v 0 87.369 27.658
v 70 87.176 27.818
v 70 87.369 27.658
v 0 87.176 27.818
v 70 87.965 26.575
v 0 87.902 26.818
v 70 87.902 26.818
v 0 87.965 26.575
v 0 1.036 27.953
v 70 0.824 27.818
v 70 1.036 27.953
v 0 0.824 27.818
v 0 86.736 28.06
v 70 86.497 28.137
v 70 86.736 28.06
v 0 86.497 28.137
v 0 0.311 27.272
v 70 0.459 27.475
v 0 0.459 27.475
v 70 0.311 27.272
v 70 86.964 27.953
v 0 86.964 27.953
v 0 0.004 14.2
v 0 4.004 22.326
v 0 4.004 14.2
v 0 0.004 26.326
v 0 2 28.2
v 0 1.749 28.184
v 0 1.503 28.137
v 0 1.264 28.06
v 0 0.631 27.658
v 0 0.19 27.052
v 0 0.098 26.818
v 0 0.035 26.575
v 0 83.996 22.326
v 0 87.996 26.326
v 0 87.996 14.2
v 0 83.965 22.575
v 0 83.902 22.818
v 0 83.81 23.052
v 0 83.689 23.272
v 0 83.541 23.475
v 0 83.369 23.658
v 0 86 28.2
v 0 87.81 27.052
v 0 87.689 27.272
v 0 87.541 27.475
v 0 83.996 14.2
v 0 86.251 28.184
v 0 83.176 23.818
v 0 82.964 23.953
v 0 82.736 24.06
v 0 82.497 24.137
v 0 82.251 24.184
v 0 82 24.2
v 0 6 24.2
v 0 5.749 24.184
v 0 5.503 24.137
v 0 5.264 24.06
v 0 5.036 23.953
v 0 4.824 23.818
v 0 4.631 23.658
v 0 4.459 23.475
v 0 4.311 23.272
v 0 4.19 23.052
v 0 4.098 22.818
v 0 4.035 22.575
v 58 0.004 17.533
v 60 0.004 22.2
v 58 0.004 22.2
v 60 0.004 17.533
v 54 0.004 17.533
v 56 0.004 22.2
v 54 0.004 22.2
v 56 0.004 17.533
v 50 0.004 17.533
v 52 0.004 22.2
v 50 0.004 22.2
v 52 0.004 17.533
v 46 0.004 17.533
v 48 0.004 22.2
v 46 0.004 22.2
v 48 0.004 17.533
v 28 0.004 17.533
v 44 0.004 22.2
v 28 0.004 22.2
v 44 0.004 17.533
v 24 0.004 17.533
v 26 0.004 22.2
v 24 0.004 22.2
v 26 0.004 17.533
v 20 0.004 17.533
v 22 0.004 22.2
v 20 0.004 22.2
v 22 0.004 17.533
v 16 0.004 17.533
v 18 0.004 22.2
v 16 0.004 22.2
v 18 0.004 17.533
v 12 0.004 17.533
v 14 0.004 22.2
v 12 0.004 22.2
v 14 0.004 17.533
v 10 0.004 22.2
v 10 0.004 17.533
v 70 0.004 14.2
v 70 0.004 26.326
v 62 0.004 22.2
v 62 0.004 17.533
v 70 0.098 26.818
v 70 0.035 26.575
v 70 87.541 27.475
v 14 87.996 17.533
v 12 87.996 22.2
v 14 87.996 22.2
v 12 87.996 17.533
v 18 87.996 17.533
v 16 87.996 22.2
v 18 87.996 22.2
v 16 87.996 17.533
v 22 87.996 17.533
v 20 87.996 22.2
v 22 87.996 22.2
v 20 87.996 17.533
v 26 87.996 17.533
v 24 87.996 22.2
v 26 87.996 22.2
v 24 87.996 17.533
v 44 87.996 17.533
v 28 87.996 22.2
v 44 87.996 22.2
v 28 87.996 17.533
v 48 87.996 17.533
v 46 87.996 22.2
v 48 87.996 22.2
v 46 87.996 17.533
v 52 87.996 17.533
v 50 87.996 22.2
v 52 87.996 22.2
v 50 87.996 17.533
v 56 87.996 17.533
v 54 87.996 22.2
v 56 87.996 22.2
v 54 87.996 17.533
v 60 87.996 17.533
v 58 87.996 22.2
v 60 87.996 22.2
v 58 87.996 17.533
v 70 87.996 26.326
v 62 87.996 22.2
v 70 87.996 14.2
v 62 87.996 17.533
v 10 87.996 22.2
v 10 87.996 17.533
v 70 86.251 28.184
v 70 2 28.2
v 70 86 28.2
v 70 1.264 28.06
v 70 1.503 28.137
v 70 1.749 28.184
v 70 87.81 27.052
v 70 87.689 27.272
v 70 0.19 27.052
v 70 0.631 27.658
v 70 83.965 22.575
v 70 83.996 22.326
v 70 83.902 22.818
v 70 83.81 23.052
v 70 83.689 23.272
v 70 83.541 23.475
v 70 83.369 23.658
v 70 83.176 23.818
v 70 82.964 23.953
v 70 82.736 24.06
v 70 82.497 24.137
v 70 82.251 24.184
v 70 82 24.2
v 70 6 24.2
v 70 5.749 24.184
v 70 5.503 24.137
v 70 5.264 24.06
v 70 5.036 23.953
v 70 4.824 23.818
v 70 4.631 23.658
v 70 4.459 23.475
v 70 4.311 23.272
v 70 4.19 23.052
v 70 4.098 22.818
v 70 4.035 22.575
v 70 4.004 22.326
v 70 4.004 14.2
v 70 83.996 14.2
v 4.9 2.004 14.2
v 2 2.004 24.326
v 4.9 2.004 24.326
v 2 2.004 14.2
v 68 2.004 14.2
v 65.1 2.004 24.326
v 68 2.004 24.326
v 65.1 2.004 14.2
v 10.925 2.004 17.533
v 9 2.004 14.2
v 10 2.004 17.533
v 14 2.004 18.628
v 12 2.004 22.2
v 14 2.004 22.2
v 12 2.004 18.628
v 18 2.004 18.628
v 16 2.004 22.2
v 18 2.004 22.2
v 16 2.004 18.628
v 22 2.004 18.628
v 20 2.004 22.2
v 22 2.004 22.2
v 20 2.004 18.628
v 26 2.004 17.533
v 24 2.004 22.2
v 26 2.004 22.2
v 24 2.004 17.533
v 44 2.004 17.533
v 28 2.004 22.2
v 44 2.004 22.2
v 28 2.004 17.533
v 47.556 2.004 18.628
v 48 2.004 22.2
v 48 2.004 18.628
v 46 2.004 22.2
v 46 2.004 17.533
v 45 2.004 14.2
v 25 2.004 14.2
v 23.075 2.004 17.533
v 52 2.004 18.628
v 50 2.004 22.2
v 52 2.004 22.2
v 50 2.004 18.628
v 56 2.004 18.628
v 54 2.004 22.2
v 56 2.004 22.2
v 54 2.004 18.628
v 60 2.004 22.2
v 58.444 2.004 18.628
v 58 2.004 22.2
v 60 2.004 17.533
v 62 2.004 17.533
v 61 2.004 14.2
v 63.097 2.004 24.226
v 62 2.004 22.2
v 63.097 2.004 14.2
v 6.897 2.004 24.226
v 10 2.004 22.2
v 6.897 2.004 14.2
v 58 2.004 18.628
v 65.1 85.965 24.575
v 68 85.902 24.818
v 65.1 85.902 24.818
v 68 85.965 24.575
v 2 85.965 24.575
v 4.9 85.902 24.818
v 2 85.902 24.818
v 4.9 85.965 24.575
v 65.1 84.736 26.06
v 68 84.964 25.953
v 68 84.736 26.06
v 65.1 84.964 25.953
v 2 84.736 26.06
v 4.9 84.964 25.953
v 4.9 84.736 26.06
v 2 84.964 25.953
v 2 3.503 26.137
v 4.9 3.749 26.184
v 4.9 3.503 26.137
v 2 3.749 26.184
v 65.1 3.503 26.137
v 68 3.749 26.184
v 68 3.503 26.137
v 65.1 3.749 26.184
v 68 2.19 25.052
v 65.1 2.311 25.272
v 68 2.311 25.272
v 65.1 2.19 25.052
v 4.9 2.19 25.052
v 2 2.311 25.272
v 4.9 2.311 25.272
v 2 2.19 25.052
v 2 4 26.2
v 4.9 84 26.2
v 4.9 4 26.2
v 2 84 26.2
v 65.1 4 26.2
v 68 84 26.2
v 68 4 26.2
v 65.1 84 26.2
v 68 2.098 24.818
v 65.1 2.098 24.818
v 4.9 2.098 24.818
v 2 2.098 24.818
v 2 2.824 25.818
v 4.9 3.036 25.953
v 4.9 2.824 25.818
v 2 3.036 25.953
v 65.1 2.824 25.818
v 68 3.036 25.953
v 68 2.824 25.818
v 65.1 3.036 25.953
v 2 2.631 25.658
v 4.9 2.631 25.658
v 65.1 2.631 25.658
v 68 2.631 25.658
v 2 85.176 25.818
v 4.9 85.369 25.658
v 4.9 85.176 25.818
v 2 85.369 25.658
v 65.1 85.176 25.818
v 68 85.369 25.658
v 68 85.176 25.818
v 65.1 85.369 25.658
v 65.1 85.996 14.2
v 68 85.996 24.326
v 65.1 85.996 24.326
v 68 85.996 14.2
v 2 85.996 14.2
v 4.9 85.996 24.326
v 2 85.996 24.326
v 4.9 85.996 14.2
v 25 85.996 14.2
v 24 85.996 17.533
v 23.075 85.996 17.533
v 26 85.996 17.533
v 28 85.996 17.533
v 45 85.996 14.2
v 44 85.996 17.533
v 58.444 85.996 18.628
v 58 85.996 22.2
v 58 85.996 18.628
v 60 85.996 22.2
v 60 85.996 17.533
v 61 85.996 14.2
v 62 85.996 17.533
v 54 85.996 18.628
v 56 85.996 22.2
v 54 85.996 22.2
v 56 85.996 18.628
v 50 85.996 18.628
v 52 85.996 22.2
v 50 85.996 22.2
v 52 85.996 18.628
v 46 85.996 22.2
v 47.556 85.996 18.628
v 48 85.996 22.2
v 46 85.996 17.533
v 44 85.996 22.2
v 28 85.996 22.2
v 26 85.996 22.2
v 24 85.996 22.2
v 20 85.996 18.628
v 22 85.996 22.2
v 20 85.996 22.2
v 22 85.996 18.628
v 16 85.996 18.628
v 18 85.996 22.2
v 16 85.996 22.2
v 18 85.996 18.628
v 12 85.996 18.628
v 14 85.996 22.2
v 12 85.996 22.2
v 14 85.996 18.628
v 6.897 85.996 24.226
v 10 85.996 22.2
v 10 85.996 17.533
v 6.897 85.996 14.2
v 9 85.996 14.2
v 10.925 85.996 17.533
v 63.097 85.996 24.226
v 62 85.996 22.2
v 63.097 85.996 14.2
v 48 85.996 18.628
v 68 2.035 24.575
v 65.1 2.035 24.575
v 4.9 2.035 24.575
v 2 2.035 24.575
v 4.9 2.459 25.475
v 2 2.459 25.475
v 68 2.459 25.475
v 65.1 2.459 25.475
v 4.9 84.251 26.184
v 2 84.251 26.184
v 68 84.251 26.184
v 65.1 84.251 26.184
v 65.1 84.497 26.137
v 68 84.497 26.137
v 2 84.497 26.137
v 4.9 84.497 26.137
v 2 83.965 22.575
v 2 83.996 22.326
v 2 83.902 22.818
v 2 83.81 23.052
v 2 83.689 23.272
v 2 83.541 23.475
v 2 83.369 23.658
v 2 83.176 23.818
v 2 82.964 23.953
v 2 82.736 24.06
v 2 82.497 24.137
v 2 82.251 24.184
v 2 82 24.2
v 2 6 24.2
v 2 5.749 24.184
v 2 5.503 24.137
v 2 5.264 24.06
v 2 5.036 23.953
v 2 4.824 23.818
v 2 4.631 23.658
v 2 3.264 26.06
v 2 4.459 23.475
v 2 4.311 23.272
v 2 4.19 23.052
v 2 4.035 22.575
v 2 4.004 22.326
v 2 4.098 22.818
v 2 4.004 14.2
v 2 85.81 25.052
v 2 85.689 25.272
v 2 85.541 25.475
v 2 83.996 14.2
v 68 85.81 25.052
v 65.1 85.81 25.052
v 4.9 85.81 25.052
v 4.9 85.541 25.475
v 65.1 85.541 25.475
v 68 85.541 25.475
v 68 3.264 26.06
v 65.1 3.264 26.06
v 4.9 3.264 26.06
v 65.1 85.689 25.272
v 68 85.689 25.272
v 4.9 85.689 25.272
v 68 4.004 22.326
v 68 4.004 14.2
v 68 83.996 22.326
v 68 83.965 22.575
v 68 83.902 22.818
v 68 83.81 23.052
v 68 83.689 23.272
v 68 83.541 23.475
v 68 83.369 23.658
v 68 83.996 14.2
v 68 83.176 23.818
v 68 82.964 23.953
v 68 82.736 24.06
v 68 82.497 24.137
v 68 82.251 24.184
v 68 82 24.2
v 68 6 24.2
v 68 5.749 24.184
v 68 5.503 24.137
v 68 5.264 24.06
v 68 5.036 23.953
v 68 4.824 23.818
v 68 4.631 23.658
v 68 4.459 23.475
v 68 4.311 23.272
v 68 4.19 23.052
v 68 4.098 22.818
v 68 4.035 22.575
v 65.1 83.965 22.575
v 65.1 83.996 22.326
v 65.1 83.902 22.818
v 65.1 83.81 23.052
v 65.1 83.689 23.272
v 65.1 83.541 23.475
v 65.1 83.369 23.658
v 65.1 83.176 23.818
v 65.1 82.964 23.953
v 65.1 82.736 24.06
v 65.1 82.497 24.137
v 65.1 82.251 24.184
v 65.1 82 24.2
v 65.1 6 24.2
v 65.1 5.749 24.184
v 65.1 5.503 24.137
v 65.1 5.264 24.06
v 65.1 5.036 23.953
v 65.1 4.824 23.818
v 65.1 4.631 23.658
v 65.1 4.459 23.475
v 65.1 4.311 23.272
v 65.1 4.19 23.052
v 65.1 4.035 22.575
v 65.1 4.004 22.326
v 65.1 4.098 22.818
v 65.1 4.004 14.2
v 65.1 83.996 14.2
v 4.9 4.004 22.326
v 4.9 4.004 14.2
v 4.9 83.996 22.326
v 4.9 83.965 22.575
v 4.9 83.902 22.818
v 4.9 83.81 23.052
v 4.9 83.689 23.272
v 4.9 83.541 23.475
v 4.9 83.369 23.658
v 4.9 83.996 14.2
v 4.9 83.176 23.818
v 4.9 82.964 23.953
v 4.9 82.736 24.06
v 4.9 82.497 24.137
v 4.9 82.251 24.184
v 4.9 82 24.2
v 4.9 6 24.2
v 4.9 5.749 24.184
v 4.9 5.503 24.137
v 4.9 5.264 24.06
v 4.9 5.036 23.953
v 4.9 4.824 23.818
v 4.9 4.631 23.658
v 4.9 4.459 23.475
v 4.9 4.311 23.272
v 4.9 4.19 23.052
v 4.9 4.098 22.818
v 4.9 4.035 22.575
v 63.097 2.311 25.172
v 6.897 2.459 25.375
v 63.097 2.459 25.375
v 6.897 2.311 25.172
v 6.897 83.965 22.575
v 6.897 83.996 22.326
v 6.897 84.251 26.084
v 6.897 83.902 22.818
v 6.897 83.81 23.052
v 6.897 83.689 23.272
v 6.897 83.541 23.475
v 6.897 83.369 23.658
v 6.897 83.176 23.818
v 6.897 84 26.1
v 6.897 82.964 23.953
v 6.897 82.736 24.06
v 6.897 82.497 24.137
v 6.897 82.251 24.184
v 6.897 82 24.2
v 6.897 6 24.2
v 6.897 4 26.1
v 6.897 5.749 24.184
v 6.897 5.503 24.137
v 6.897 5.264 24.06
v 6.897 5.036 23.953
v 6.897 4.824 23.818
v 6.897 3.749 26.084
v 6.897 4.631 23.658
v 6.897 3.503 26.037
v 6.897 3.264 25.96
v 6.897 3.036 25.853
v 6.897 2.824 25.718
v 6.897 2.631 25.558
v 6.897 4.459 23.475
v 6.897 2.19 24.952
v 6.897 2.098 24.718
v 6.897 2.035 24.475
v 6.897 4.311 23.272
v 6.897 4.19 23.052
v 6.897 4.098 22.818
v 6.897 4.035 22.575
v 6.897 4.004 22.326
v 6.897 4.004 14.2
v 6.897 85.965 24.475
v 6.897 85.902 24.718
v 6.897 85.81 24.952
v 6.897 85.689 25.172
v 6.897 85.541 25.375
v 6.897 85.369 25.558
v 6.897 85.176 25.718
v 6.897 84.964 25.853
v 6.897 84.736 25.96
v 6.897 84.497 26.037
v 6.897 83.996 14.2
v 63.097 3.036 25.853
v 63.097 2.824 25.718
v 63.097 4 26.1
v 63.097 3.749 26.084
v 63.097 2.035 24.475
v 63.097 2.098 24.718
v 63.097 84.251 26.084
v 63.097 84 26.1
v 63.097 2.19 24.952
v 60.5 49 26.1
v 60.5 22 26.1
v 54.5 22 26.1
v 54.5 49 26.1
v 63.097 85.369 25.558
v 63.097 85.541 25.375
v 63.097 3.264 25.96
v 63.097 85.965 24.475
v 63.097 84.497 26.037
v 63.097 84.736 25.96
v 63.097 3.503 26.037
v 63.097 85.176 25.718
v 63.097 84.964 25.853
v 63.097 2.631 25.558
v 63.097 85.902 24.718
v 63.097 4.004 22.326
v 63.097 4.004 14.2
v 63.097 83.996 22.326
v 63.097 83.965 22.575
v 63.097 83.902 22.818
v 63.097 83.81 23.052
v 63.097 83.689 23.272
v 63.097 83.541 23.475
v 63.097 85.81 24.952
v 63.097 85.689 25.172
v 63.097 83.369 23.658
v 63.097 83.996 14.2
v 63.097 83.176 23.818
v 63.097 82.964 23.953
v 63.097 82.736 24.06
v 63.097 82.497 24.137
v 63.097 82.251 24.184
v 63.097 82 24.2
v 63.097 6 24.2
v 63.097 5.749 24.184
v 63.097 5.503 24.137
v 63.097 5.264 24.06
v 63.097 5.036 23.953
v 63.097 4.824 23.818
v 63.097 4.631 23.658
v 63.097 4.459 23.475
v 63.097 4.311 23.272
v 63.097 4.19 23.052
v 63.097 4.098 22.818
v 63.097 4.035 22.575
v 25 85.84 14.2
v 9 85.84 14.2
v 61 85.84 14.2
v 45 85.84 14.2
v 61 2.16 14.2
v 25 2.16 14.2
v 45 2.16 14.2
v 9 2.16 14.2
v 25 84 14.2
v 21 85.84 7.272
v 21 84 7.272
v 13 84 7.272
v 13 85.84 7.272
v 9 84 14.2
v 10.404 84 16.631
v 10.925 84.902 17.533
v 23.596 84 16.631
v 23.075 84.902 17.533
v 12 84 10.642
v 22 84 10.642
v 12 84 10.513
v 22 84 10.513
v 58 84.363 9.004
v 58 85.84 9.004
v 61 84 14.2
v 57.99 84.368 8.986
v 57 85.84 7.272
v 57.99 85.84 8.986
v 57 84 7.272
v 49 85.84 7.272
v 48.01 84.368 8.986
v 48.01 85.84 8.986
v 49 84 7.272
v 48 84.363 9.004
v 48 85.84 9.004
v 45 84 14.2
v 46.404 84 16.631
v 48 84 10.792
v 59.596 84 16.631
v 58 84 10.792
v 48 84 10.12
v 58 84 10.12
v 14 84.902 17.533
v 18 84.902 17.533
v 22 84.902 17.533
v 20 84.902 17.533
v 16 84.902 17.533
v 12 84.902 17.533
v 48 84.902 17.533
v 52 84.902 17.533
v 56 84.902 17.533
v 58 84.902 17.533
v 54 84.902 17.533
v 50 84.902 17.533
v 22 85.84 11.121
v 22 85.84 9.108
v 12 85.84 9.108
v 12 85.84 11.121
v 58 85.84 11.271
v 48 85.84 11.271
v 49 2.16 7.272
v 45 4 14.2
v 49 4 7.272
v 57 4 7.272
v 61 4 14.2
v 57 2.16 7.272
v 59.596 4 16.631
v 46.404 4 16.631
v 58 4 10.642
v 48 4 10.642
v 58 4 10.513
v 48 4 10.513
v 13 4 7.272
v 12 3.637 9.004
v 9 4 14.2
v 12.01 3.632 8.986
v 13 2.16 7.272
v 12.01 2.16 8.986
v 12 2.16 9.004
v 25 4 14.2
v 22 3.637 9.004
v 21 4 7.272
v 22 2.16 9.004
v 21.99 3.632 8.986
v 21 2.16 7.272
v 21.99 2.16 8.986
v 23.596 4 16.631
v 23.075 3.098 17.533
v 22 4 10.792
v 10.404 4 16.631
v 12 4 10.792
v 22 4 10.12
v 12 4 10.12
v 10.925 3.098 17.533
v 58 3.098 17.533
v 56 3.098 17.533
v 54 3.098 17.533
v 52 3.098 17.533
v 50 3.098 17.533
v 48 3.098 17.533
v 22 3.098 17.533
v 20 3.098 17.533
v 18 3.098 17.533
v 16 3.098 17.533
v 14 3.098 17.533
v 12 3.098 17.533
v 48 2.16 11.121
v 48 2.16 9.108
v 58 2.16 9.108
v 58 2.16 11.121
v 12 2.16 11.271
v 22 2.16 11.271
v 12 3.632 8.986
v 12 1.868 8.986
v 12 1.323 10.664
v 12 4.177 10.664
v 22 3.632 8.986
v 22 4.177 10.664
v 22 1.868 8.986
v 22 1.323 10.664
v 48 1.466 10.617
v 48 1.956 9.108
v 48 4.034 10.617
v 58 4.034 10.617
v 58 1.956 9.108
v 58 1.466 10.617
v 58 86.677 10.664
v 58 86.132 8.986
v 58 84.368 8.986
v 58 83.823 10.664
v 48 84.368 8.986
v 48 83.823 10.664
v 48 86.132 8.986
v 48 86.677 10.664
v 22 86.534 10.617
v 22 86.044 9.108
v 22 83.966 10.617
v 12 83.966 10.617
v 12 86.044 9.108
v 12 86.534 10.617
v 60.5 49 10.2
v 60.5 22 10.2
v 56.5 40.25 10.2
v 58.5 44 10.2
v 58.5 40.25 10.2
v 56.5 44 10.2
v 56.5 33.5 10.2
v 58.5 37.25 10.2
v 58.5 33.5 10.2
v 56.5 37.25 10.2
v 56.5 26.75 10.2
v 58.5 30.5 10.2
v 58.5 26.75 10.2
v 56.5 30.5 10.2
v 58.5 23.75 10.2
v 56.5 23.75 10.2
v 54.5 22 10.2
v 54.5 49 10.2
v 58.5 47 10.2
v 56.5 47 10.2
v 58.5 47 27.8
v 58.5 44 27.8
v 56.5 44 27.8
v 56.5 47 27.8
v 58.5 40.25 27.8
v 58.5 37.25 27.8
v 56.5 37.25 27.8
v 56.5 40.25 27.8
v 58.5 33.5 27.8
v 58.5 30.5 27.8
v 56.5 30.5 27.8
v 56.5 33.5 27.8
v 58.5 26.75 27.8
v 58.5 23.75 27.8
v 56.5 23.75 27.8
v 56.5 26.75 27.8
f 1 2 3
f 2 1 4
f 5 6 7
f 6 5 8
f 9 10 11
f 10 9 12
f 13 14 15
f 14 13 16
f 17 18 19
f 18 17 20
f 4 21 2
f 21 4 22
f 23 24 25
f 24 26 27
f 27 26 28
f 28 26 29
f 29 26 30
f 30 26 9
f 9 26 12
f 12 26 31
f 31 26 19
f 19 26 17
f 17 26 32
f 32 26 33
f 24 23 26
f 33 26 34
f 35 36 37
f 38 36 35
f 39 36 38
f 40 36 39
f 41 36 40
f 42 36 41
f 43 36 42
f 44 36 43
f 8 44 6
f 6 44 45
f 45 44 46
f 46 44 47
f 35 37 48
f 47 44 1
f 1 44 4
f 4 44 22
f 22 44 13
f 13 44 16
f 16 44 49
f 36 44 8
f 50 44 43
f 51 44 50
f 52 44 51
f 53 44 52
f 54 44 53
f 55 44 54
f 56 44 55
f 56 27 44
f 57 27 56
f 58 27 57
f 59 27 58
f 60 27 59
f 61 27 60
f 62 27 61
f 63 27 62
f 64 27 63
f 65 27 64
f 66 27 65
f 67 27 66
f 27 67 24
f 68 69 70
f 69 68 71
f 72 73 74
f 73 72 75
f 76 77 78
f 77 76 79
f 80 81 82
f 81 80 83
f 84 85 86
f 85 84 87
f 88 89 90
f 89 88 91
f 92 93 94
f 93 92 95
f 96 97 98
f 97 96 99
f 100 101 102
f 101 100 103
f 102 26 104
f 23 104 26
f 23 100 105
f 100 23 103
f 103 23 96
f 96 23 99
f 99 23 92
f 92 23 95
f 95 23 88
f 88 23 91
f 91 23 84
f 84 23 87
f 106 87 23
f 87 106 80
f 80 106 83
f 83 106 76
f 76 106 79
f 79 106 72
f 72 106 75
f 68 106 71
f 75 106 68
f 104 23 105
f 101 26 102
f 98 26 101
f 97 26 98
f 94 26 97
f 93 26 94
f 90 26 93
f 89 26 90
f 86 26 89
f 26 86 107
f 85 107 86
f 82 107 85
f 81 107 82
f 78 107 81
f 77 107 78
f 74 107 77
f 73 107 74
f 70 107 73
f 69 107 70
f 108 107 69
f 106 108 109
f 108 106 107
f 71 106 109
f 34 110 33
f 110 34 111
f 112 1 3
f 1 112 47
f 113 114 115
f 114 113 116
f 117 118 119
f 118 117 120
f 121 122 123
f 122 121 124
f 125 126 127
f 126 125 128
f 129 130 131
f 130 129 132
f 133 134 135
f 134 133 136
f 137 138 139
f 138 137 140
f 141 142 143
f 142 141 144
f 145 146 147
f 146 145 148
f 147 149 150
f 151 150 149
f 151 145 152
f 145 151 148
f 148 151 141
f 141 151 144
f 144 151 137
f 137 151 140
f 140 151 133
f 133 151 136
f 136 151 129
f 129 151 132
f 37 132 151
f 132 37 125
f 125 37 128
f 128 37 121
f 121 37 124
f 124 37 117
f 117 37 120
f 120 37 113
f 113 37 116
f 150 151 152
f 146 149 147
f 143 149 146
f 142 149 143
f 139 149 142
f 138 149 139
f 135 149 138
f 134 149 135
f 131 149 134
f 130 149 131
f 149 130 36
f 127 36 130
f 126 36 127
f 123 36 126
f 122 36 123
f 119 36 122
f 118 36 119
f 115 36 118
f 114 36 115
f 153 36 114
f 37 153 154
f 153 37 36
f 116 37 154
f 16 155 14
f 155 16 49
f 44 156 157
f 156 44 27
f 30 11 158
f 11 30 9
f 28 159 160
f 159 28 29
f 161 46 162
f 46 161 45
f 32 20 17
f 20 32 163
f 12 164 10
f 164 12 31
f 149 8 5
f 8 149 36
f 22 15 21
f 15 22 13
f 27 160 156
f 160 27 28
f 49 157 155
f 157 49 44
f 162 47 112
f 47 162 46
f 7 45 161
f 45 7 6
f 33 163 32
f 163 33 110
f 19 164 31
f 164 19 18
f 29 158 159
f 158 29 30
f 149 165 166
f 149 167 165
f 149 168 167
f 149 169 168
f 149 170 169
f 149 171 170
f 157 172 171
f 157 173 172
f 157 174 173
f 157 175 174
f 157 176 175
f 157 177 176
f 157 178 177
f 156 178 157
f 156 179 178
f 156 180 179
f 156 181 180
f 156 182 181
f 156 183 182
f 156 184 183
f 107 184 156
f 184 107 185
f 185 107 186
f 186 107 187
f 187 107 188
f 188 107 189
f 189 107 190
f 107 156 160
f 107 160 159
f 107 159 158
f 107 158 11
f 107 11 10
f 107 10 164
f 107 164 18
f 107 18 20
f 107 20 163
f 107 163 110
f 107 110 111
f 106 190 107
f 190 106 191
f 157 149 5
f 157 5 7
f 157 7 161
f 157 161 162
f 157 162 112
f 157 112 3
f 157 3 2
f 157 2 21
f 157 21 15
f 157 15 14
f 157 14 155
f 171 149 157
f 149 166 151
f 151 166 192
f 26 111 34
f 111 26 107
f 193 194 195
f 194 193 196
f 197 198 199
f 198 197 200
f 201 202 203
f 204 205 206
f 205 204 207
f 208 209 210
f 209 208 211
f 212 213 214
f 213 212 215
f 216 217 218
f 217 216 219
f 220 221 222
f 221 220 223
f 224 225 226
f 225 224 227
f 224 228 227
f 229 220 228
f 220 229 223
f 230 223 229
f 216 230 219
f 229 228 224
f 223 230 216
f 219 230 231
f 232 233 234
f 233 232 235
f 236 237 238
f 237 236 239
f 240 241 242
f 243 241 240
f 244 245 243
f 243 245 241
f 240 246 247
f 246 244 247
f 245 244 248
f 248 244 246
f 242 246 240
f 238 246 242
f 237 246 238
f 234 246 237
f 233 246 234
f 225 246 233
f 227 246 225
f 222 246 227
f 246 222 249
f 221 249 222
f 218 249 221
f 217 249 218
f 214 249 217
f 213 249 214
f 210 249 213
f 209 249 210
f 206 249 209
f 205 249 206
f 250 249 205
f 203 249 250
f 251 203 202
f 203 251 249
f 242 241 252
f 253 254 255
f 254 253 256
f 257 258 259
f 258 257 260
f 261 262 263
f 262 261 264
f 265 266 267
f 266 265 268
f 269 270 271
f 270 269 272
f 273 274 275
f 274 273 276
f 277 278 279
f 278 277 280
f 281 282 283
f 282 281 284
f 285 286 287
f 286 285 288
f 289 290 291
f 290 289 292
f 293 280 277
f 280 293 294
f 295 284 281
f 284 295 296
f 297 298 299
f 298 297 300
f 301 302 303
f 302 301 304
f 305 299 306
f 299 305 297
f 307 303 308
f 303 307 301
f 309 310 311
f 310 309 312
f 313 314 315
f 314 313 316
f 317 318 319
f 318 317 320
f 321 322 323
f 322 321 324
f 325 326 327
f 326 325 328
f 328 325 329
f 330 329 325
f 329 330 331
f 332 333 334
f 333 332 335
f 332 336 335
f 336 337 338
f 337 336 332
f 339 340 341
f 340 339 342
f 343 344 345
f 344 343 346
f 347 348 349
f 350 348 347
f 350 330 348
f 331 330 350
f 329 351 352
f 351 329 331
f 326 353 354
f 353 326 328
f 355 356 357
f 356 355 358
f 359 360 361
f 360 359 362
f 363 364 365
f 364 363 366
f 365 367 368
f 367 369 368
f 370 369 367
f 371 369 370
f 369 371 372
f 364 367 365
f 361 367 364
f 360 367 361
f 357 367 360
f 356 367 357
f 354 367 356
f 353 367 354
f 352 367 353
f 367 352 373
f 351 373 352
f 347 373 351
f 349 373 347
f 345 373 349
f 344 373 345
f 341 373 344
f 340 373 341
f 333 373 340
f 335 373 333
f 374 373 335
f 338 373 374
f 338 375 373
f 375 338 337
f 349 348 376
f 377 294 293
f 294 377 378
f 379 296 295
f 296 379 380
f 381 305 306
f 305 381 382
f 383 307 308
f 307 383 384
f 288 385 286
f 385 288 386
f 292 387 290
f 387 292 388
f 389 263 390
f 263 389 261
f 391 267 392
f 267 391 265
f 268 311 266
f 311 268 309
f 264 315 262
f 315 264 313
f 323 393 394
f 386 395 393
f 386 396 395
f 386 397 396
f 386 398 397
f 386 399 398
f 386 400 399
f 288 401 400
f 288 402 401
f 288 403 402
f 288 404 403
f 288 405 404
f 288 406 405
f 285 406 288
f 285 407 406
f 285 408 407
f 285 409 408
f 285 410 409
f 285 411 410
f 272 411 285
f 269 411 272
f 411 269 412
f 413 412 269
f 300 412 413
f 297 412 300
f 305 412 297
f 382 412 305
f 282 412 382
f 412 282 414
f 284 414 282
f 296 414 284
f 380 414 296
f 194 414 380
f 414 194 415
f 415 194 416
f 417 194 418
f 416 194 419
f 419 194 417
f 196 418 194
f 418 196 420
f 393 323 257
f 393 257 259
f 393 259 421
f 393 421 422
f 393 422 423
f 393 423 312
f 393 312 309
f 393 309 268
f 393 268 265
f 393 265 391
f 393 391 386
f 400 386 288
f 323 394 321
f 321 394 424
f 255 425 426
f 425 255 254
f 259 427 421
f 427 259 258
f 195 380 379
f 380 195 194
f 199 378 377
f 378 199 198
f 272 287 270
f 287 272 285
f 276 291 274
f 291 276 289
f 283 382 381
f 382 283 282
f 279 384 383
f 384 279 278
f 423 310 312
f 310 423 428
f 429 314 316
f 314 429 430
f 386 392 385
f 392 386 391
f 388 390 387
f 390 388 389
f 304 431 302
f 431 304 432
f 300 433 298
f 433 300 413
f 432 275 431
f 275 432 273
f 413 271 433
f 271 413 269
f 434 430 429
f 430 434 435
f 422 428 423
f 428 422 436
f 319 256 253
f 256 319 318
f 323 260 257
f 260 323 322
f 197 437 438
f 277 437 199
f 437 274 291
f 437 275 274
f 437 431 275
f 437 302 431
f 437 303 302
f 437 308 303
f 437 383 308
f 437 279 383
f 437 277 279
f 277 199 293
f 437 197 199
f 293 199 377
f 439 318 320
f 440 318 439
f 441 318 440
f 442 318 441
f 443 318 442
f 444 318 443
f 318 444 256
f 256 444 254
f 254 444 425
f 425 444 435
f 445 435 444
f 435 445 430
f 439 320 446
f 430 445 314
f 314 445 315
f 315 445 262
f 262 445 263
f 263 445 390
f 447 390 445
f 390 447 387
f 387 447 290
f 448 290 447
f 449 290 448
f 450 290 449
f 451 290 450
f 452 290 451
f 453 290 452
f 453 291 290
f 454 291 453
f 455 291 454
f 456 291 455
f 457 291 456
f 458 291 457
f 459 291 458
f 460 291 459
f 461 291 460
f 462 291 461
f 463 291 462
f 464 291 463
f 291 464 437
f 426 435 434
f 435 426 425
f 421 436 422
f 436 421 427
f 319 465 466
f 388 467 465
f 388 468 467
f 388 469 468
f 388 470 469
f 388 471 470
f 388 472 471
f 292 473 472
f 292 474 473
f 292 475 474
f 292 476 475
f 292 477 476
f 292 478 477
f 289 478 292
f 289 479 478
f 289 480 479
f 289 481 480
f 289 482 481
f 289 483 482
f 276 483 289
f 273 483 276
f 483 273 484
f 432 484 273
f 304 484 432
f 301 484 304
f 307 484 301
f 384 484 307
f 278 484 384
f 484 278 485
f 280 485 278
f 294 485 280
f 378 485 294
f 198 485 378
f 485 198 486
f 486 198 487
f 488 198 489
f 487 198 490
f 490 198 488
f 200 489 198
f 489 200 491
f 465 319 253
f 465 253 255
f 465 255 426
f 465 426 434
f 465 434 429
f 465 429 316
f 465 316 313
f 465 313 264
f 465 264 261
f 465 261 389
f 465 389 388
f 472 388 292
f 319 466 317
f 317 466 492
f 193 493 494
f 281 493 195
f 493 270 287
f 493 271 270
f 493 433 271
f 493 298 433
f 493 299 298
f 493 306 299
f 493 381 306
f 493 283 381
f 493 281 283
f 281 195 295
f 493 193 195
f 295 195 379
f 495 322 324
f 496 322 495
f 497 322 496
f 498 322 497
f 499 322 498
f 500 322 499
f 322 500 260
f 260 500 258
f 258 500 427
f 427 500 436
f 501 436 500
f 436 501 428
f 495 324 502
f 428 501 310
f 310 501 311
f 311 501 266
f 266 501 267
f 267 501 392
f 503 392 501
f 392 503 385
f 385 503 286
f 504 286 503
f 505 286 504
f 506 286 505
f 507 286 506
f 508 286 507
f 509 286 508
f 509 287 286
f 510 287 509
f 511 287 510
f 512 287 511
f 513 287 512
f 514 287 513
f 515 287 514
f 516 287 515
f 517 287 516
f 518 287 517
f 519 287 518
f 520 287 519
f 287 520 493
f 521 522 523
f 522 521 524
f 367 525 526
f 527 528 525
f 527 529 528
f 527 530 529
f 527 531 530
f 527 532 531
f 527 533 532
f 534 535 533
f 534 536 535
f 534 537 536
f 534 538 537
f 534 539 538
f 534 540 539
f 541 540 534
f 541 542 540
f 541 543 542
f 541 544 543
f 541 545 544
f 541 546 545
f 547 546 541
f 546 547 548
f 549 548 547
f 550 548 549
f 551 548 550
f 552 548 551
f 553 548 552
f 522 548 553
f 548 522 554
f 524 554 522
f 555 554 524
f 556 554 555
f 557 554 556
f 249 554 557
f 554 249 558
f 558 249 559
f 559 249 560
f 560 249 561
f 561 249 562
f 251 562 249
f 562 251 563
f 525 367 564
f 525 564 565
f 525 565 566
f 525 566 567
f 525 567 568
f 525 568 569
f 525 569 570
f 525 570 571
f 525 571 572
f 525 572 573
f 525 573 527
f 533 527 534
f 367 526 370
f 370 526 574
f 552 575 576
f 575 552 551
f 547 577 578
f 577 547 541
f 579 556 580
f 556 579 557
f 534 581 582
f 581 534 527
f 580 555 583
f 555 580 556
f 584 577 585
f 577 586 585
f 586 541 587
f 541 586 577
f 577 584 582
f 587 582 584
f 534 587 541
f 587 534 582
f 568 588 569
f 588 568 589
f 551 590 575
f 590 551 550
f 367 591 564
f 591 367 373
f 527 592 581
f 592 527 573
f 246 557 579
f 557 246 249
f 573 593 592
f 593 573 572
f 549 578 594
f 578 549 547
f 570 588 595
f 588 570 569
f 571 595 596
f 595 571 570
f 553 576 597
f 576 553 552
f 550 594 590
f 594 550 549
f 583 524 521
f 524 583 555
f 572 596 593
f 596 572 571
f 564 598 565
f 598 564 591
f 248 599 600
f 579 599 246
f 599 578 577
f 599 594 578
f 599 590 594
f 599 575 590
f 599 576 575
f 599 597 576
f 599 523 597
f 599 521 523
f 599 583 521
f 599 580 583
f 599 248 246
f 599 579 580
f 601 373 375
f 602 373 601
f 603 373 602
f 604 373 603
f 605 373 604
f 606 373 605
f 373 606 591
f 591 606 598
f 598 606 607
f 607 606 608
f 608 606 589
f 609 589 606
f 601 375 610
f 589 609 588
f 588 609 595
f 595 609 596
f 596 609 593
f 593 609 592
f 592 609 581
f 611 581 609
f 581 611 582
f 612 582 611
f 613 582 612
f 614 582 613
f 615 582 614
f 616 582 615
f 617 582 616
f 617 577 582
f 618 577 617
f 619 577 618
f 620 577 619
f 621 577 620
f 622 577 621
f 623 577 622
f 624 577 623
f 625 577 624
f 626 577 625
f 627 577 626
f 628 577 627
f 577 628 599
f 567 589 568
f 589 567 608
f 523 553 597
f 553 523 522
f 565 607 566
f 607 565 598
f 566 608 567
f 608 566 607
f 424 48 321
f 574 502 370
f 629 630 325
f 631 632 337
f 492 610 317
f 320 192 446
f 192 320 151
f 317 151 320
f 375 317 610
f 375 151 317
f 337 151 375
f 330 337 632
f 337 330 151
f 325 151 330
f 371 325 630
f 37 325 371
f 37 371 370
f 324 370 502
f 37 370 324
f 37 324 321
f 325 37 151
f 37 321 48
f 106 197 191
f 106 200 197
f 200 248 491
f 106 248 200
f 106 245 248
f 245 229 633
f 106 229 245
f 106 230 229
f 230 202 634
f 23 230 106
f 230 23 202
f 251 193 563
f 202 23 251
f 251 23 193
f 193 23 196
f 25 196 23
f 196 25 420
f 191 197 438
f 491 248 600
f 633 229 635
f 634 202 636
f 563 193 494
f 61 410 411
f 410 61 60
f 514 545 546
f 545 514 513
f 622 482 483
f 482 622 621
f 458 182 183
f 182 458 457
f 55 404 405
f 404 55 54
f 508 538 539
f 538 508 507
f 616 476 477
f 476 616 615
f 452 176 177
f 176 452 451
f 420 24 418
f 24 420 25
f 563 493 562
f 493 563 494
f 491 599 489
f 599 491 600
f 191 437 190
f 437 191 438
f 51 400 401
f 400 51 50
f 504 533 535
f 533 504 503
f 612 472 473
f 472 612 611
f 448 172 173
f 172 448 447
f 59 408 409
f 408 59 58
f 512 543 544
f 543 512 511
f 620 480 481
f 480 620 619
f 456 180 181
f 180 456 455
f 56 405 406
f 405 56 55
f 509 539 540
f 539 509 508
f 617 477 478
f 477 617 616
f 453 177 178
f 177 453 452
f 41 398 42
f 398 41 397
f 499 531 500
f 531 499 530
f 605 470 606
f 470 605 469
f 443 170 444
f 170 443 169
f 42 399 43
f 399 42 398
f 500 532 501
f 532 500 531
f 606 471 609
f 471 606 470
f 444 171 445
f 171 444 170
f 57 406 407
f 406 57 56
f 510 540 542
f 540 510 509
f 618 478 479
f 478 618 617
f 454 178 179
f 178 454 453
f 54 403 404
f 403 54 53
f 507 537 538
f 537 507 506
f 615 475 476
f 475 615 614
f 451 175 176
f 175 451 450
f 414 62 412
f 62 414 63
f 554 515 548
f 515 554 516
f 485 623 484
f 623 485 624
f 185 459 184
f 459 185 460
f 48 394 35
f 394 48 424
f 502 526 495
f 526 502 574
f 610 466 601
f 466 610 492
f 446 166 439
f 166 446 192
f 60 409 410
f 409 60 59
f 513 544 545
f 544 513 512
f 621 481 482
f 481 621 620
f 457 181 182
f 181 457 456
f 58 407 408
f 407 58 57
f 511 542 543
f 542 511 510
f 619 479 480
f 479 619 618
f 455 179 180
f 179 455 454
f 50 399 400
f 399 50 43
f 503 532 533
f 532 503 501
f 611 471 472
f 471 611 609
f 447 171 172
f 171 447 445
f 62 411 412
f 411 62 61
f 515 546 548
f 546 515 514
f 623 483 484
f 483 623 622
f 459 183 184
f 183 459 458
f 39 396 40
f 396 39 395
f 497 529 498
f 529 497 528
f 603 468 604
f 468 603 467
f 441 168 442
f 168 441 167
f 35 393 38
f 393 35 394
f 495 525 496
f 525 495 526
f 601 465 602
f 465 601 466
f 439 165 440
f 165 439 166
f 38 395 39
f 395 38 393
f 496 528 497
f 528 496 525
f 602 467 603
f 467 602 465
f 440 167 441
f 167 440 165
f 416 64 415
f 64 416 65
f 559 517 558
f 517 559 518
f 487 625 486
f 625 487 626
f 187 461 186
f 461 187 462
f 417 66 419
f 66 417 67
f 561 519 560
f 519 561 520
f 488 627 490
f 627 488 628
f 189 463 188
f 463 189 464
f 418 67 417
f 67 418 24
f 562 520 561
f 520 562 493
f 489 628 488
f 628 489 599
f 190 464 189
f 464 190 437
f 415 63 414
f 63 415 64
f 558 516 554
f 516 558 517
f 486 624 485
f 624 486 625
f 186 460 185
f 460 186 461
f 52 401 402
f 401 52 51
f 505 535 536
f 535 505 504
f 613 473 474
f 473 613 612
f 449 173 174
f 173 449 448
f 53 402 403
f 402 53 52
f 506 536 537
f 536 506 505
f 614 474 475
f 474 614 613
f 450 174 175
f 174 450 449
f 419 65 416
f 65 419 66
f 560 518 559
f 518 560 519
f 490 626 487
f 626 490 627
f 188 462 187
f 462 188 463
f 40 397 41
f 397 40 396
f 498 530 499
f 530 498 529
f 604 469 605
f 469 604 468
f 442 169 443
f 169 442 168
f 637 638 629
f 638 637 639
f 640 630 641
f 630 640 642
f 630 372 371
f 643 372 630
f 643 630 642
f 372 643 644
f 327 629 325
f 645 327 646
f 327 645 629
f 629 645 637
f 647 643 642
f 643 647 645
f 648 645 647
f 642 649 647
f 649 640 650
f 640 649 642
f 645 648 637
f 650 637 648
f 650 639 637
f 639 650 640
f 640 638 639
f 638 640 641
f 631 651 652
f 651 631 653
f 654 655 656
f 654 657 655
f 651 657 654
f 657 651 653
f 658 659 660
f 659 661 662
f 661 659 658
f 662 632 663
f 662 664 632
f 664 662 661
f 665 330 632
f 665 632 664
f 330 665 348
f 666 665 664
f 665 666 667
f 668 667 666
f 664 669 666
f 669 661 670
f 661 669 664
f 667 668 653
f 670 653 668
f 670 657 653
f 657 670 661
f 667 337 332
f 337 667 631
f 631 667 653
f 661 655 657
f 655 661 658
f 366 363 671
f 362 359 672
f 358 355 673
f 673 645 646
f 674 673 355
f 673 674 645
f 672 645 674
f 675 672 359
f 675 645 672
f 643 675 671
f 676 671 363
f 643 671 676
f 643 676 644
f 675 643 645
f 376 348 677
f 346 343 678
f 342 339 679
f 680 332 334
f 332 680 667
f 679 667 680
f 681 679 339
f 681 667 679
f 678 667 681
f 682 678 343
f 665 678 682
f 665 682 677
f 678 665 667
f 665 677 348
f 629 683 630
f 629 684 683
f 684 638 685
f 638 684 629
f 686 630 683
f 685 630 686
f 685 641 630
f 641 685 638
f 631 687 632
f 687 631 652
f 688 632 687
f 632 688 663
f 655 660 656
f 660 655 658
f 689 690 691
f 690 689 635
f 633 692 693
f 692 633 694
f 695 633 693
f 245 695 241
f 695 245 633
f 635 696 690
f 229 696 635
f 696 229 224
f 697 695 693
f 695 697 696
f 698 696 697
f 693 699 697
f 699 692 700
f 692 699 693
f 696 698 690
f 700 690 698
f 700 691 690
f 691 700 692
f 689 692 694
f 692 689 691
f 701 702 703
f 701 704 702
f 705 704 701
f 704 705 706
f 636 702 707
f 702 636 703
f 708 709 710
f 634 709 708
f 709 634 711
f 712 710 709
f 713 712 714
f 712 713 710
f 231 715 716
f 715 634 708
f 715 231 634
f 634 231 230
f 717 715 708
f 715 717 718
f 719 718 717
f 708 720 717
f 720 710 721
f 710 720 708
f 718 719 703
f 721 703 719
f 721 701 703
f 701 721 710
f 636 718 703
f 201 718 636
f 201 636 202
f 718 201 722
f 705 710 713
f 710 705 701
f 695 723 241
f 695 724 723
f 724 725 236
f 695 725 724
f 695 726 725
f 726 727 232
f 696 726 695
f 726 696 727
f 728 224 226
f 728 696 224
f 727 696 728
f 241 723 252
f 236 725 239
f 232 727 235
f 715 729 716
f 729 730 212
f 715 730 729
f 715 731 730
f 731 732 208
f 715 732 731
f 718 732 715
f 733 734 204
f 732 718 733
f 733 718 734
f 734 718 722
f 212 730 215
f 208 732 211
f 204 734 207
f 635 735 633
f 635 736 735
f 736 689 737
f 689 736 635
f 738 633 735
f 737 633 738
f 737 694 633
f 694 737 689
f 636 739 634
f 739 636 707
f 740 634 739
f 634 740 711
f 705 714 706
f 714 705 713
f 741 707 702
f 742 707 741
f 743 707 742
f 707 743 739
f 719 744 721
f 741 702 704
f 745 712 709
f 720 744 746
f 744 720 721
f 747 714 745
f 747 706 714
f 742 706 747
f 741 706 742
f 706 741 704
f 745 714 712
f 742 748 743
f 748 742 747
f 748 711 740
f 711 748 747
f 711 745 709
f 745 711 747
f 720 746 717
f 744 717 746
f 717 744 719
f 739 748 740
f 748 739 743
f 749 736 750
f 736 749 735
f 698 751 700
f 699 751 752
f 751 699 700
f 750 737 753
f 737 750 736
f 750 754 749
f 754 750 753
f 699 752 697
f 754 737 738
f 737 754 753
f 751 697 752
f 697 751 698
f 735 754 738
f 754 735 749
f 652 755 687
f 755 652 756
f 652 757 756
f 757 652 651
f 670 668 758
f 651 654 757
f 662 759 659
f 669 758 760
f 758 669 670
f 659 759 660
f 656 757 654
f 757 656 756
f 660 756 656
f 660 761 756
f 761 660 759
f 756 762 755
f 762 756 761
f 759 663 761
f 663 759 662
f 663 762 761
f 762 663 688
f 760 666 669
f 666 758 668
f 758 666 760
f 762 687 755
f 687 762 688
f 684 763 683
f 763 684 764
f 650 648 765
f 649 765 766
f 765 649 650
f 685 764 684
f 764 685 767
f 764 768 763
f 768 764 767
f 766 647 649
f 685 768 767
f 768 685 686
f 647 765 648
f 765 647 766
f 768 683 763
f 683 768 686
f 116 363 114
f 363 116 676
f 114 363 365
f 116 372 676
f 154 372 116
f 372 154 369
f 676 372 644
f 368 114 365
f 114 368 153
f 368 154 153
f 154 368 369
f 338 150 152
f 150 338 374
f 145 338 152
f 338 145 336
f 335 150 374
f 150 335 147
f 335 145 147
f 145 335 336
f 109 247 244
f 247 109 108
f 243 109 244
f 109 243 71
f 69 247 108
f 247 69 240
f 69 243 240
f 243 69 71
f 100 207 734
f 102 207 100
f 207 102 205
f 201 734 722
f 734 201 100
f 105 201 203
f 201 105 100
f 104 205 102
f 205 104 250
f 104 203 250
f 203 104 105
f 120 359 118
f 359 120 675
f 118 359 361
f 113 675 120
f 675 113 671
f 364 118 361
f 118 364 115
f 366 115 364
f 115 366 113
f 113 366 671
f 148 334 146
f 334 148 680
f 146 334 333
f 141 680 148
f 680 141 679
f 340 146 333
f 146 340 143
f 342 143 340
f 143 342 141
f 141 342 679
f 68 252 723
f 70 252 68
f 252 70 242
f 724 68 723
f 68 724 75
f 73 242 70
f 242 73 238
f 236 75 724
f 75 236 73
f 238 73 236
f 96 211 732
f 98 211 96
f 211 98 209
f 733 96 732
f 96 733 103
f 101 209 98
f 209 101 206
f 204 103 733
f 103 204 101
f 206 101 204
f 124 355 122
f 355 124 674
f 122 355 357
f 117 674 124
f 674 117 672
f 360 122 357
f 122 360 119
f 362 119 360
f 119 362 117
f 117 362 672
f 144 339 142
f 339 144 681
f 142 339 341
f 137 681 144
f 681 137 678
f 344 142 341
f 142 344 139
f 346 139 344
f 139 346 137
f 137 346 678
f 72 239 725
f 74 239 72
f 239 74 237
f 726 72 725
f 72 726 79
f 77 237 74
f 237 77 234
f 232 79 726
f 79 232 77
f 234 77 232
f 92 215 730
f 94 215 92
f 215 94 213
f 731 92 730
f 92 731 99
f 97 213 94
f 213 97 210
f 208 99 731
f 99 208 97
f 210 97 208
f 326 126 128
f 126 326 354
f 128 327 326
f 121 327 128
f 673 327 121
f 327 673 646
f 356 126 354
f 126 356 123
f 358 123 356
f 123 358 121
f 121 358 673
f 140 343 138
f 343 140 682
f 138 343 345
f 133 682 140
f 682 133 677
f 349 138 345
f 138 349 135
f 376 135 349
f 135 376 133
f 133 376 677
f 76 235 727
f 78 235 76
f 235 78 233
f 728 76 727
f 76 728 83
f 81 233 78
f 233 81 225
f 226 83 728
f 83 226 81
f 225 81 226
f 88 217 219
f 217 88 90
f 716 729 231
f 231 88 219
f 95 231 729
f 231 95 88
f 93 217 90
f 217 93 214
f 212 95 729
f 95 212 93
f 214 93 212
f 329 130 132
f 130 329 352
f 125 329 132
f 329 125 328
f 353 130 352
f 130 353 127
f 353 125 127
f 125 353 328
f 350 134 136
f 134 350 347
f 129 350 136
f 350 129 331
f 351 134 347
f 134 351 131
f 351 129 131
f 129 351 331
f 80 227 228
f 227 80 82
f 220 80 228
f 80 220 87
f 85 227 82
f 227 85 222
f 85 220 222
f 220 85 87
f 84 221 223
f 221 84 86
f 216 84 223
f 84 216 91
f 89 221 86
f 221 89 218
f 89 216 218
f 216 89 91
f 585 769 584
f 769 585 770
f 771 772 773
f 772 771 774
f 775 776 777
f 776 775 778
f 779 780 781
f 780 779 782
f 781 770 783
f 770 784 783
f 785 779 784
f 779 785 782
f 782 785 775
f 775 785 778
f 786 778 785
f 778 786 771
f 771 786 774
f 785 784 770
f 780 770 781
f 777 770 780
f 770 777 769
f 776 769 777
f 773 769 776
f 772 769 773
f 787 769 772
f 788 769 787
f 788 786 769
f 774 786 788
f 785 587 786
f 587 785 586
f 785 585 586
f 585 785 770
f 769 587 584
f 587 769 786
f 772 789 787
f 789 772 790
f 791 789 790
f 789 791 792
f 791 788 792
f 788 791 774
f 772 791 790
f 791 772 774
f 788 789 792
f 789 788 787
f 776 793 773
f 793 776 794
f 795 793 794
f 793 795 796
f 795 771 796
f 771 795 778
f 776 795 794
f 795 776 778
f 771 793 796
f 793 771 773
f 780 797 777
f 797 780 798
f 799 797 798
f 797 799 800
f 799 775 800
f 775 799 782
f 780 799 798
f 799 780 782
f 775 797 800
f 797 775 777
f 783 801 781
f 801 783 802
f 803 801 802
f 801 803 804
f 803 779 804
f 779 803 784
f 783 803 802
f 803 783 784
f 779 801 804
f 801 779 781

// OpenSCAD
/*//////////////////////////////////////////////////////////////////
              -    FB Aka Heartman/Hearty 2016     -                   
              -   http://heartygfx.blogspot.com    -                  
              -       OpenScad Parametric Box      -                     
              -         CC BY-NC 3.0 License       -                      
////////////////////////////////////////////////////////////////////                                                                                                             
12/02/2016 - Fixed minor bug 
28/02/2016 - Added holes ventilation option                    
09/03/2016 - Added PCB feet support, fixed the shell artefact on export mode. 

*/////////////////////////// - Info - //////////////////////////////

// All coordinates are starting as integrated circuit pins.
// From the top view :

//   CoordD           <---       CoordC
//                                 ^
//                                 ^
//                                 ^
//   CoordA           --->       CoordB


////////////////////////////////////////////////////////////////////


////////// - Paramètres de la boite - Box parameters - /////////////

/* [Box dimensions] */
// - Longueur - Length  
  Length        = 70;       
// - Largeur - Width
  Width         = 88;                     
// - Hauteur - Height  
  Height        = 28;  
// - Epaisseur - Wall thickness  
  Thick         = 2;//[2:5]  
  
/* [Box options] */
// - Diamètre Coin arrondi - Filet diameter  
  Filet         = 2;//[0.1:12] 
// - lissage de l'arrondi - Filet smoothness  
  Resolution    = 50;//[1:100] 
// - Tolérance - Tolerance (Panel/rails gap)
  m             = 0.9;
// Pieds PCB - PCB feet (x4) 
  PCBFeet       = 0;// Bottom [0:No, 1:Yes]
  TPCBFeet      = 1;// Top [0:No, 1:Yes]
  PsuHolder     = 0;// Top [0:No, 1:Yes]
  LCD128        = 0;// Fpanl [0:No, 1:Yes]
// - Decorations to ventilation holes
  Vent          = 1;// [0:No, 1:Yes]
// - Decoration-Holes width (in mm)
  Vent_width    = 2;   

/* [PCB_Feet bottom] */
//All dimensions are from the center foot axis
// - Coin bas gauche - Low left corner X position
PCBPosX         = -3.8;
// - Coin bas gauche - Low left corner Y position
PCBPosY         = 2;
// - Longueur PCB - PCB Length
PCBLength       = 68.6;
// - Largeur PCB - PCB Width
PCBWidth        = 53.3;
// - Heuteur pied - Feet height
FootHeight      = 8;
// - Diamètre pied - Foot diameter
FootDia         = 6;
// - Diamètre trou - Hole diameter
FootHole        = 2;  
// - Foot Inset
FootInset       = 2.5;
// feet 1 and 4 are offset horizontally, 2 and 3 are offset vertically
Foot1Offset     = 11.5;
Foot2Offset     = 5.2;
Foot3Offset     = 15.2;
Foot4Offset     = 12.8;

/* [PCB_Feet top] */
//All dimensions are from the center foot axis
// - Coin bas gauche - Low left corner X position
TPCBPosX         = 0;
// - Coin bas gauche - Low left corner Y position
TPCBPosY         = 0;
// - Longueur PCB - PCB Length
TPCBLength       = 53;
// - Largeur PCB - PCB Width
TPCBWidth        = 73.5;
// - Heuteur pied - Feet height
TFootHeight      = 8;
// - Diamètre pied - Foot diameter
TFootDia         = 6;
// - Diamètre trou - Hole diameter
TFootHole        = 2;  

/* [LCD Panel] */
//All dimensions are from the center foot axis
// - Coin bas gauche - Low left corner X position
LCDPosX         = 14;
// - Coin bas gauche - Low left corner Y position
LCDPosY         = 12;
// - Longueur PCB - PCB Length
LCDLength       = 43.5;
// - Largeur PCB - PCB Width
LCDWidth        = 30;

/* [STL element to export] */
//Coque haut - Top shell
TShell          = 1;// [0:No, 1:Yes]
//Coque bas- Bottom shell
BShell          = 0;// [0:No, 1:Yes]
//Panneau avant - Front panel
FPanL           = 0;// [0:No, 1:Yes]
//Panneau arrière - Back panel  
BPanL           = 0;// [0:No, 1:Yes]
//Clips is the extras for screws, etc.
Clips           = 0;

/* [Hidden] */
// - Couleur coque - Shell color  
Couleur1        = "Orange";       
// - Couleur panneaux - Panels color    
Couleur2        = "OrangeRed";    
// Thick X 2 - making decorations thicker if it is a vent to make sure they go through shell
Dec_Thick       = Vent ? Thick*2 : Thick; 
// - Depth decoration
Dec_size        = Vent ? Thick*2 : 0.8;

/////////// - Boitier générique bord arrondis - Generic rounded box - //////////

module RoundBox($a=Length, $b=Width, $c=Height){// Cube bords arrondis
                    $fn=Resolution;            
                    translate([0,Filet,Filet]){  
                    minkowski (){                                              
                        cube ([$a-(Length/2),$b-(2*Filet),$c-(2*Filet)], center = false);
                        rotate([0,90,0]){    
                        cylinder(r=Filet,h=Length/2, center = false);
                            } 
                        }
                    }
                }// End of RoundBox Module

      
////////////////////////////////// - Module Coque/Shell - //////////////////////////////////         

module Coque(){//Coque - Shell  
    Thick = Thick*2;  
    difference(){    
        difference(){//sides decoration
            union(){    
                difference() {//soustraction de la forme centrale - Substraction Fileted box
                    difference(){//soustraction cube median - Median cube slicer
                        union() {//union               
                            difference(){//Coque    
                                RoundBox();
                                translate([Thick/2,Thick/2,Thick/2]){     
                                    RoundBox($a=Length-Thick, $b=Width-Thick, $c=Height-Thick);
                                }
                            }//Fin diff Coque                            
                            difference(){//largeur Rails        
                                translate([Thick+m,Thick/2,Thick/2]){// Rails
                                    RoundBox($a=Length-((2*Thick)+(2*m)), $b=Width-Thick, $c=Height-(Thick*2));
                                }//fin Rails
                                translate([((Thick+m/2)*1.55),Thick/2,Thick/2+0.1]){ // +0.1 added to avoid the artefact
                                    RoundBox($a=Length-((Thick*3)+2*m), $b=Width-Thick, $c=Height-Thick);
                                }           
                            }//Fin largeur Rails
                        }//Fin union                                   
                        translate([-Thick,-Thick,Height/2]){// Cube à soustraire
                            cube ([Length+100, Width+100, Height], center=false);
                        }                                            
                    }//fin soustraction cube median - End Median cube slicer
                    translate([-Thick/2,Thick,Thick]){// Forme de soustraction centrale 
                        RoundBox($a=Length+Thick, $b=Width-Thick*2, $c=Height-Thick);       
                    }                          
                }                                          
                if (TShell==1) {
                    translate([Length-((3*Thick)+10),2.75,Height/2+4]){
                        rotate([0,90,0]){
                            cylinder(d=3,10);
                        }
                    }
                    translate([3*Thick,2.75,Height/2+4]){
                        rotate([0,90,0]){
                            cylinder(d=2.7,10);
                        }
                    }
                    difference(){// wall fixation box legs
                        union(){
                            translate([3*Thick +5,Thick,Height/2]){
                                rotate([90,0,0]){
                                    $fn=6;
                                    cylinder(d=16,Thick/2);
                                }   
                            }
                                
                            translate([Length-((3*Thick)+5),Thick,Height/2]){
                                rotate([90,0,0]){
                                    $fn=6;
                                    cylinder(d=16,Thick/2);
                                }   
                            }
                        }
                        translate([4,Thick+Filet,Height/2-57]){   
                            rotate([45,0,0]){
                                cube([Length,40,40]);    
                            }
                        }
                        translate([0,-(Thick*1.46),Height/2]){
                            cube([Length,Thick*2,10]);
                        }
                    } //Fin fixation box legs
                    translate([Length,Width,0]) {
                        rotate([0,0,180]) {
                            translate([Length-((3*Thick)+10),2.75,Height/2+4]){
                                rotate([0,90,0]){
                                    cylinder(d=3,10);
                                }
                            }
                            translate([3*Thick,2.75,Height/2+4]){
                                rotate([0,90,0]){
                                    cylinder(d=2.7,10);
                                }
                            }
                            difference(){// wall fixation box legs
                                union(){
                                    translate([3*Thick +5,Thick,Height/2]){
                                        rotate([90,0,0]){
                                            $fn=6;
                                            cylinder(d=16,Thick/2);
                                        }   
                                    }
                                        
                                    translate([Length-((3*Thick)+5),Thick,Height/2]){
                                        rotate([90,0,0]){
                                            $fn=6;
                                            cylinder(d=16,Thick/2);
                                        }   
                                    }
                                }
                                translate([4,Thick+Filet,Height/2-57]){   
                                    rotate([45,0,0]){
                                        cube([Length,40,40]);    
                                    }
                                }
                                translate([0,-(Thick*1.46),Height/2]){
                                    cube([Length,Thick*2,10]);
                                }
                            } //Fin fixation box legs
                        } // rotate
                    } // translate extra legs
                }
            }
            union(){// outbox sides decorations
                for(i=[0:Thick:Length/4]){
                    // Ventilation holes part code submitted by Ettie - Thanks ;) 
                    translate([10+i,-Dec_Thick+Dec_size,6]){
                        cube([Vent_width,Dec_Thick,Height/6]);
                    }
                    translate([(Length-10) - i,-Dec_Thick+Dec_size,6]){
                        cube([Vent_width,Dec_Thick,Height/6]);
                    }
                    translate([(Length-10) - i,Width-Dec_size,6]){
                        cube([Vent_width,Dec_Thick,Height/6]);
                    }
                    translate([10+i,Width-Dec_size,6]){
                        cube([Vent_width,Dec_Thick,Height/6]);
                    }
                }// fin de for
            }//fin union decoration
        }//fin difference decoration

        if (BShell==1) {
            union(){ //sides holes
                $fn=50;
                translate([3*Thick-2,2,Height/2-4]){
                    rotate([0,90,0]){
                        cylinder(d=3,14);
                    }
                }
                translate([Length-((3*Thick)+12),2,Height/2-4]){
                    rotate([0,90,0]){
                        cylinder(d=3,14);
                    }
                }
                translate([3*Thick-2,Width-2,Height/2-4]){
                    rotate([0,90,0]){
                        cylinder(d=3,14);
                    }
                }
                translate([Length-((3*Thick)+12),Width-2,Height/2-4]){
                    rotate([0,90,0]){
                        cylinder(d=3,14);
                    }
                }
            }//fin union de sides holes
        }
    }//fin de difference holes
}// fin coque 

////////////////////////////// - Experiment - ///////////////////////////////////////////





/////////////////////// - Foot with base filet - /////////////////////////////
module foot(FootDia,FootHole,FootHeight,Filet){
    color(Couleur1)   
    translate([0,0,1])
    difference(){
        cylinder(d=FootDia+Filet,FootHeight-Thick, $fn=100);
        rotate_extrude($fn=100){
            translate([(FootDia+Filet*2)/2,Filet-.3,0]){
                if (Filet>0) {
                    minkowski(){
                        square(10);
                        circle(Filet, $fn=100);
                    }
                }
            }
        }
        cylinder(d=FootHole,FootHeight+1, $fn=100);
    }          
}// Fin module foot
  
module Feet(BoardLength,BoardWidth,FHeight,FDia,FHole,F1Offset,F2Offset,F3Offset,F4Offset,Filet){     
    //////////////// - PCB only visible in the preview mode - /////////////////////    
    translate([3*Thick+2,Thick+5,FHeight+(Thick/2)-0.5]){
    
        %square ([BoardLength,BoardWidth]);
        translate([BoardLength/2,BoardWidth/2,0.5]){ 
            color("Olive")
            %text("PCB", halign="center", valign="center", font="Arial black");
        }
    } // Fin PCB 
  
    
////////////////////////////// - Feet - //////////////////////////////////////////
    translate([(3*Thick+2)+FootInset+F1Offset,(Thick+5)+FootInset,Thick/2]){
        foot(FDia,FHole,FHeight,Filet);
    }
    translate([(3*Thick+2)+BoardLength-FootInset,(Thick+5)+F2Offset+FootInset,Thick/2]){
        foot(FDia,FHole,FHeight,Filet);
    }
    translate([(3*Thick+2)+BoardLength-FootInset,(Thick+5)+BoardWidth-FootInset-F3Offset,Thick/2]){
        foot(FDia,FHole,FHeight,Filet);
    }        
    translate([(3*Thick+2)+FootInset+F4Offset,(Thick+5)+BoardWidth-FootInset,Thick/2]){
        foot(FDia,FHole,FHeight,Filet);
    }        

} // Fin du module Feet
 
 ////////////////////////////////////////////////////////////////////////
////////////////////// <- Holes Panel Manager -> ///////////////////////
////////////////////////////////////////////////////////////////////////

//                           <- Panel ->  
module Panel(Length,Width,Thick,Filet){
    scale([0.5,1,1])
    minkowski(){
            cube([Thick,Width-(Thick*2+Filet*2+m),Length-(Thick*2+Filet*2+m)]);
            translate([0,Filet,Filet])
            rotate([0,90,0])
            cylinder(r=Filet,h=Thick, $fn=100);
      }
}



//                          <- Circle hole -> 
// Cx=Cylinder X position | Cy=Cylinder Y position | Cdia= Cylinder dia | Cheight=Cyl height
module CylinderHole(OnOff,Cx,Cy,Cdia){
    if(OnOff==1)
    translate([Cx,Cy,-1])
        cylinder(d=Cdia,10, $fn=50);
}
//                          <- Square hole ->  
// Sx=Square X position | Sy=Square Y position | Sl= Square Length | Sw=Square Width | Filet = Round corner
module SquareHole(OnOff,Sx,Sy,Sl,Sw,Filet){
    if(OnOff==1)
     minkowski(){
        translate([Sx+Filet/2,Sy+Filet/2,-1])
            cube([Sl-Filet,Sw-Filet,10]);
            cylinder(d=Filet,h=10, $fn=100);
       }
}


 
//                      <- Linear text panel -> 
module LText(OnOff,Tx,Ty,Font,Size,Content){
    if(OnOff==1)
    translate([Tx,Ty,Thick+.5])
    linear_extrude(height = 1){
    text(Content, size=Size, font=Font);
    }
}
//                     <- Circular text panel->  
module CText(OnOff,Tx,Ty,Font,Size,TxtRadius,Angl,Turn,Content){ 
      if(OnOff==1) {
      Angle = -Angl / len(Content);
      translate([Tx,Ty,Thick+.5])
          for (i= [0:len(Content)-1] ){   
              rotate([0,0,i*Angle+90+Turn])
              translate([0,TxtRadius,0]) {
                linear_extrude(height = 1){
                text(Content[i], font = Font, size = Size,  valign ="baseline", halign ="center");
                    }
                }   
             }
      }
}

////////////////////// <- New module Panel -> //////////////////////
module FPanL(){
    difference(){
        color(Couleur2) {
            Panel(Height,Width,Thick,Filet);
            if (LCD128==1) {
                translate([-8,LCDPosY-6,LCDPosX-6]){
                    difference() {
                        cube([8,LCDLength+12,LCDWidth+6]);
                        union() {
                            translate([3,LCDLength+2.85,6]) rotate([0,0,45]) cube([2,2,LCDWidth+1]);
                            translate([3,6,6]) rotate([0,0,45]) cube([2,2,LCDWidth+1]);
                            translate([0,7,6]){
                                cube([8,LCDLength-2,LCDWidth]);
                                translate([3,-1,0]){
                                    cube([1.5,LCDLength,LCDWidth]);
                                }
                            }
                        }
                    }
                }
            }
/* switchblocks
            translate([0,24,0]) {
                difference() {
                    union() { 
                        translate ([-8.5,36,20])
                            cube([9,13,13]);
                        translate ([-8.5,36,31])
                            cube([9,13,13]);
                        rotate([180,270,180]){
                            translate([45,42.5,-1])
                                foot(5,2.5,10.5,1.2);
                            translate([19,42.5,-1])
                                foot(5,2.5,10.5,1.2);
                        }
                    }
                    union() {
                        translate ([-9.01,38.2,22.5])
                            cube([9,8.85,8.85]);
                        translate ([-9.01,38.2,33.5])
                            cube([9,8.85,8.85]);
                    }
                }
            }
*/            
        }

        rotate([90,0,90]){
            color(Couleur2){
                //                     <- Cutting shapes from here ->  
                SquareHole  (0,LCDPosY+12,LCDPosX+2,26,26,1); //(On/Off, Xpos,Ypos,Length,Width,Filet)
                CylinderHole(0,88,28,6.8);       //(On/Off, Xpos, Ypos, Diameter)
                //                            <- To here -> 
            }
            translate ([-.30,0,-.8]){
//                     <- Adding text from here ->          
                LText(1,10,7,"Bauhaus 93:style=Regular",7,"VPDMon");//(On/Off, Xpos, Ypos, "Font", Size, "Text")
                LText(1,55,27,"Britannic Bold:style=Regular",7,"7g");//(On/Off, Xpos, Ypos, "Font", Size, "Text")
                CText(0,20,11.8,"Arial Black",2.4,5,260,25,"1.3.5.7.9");//(On/Off, Xpos, Ypos, "Font", Size, Diameter, Arc(Deg), Starting Angle(Deg),"Text")
//                            <- To here ->
            }
        }
    }
}

module BPanL(Colour){
    difference(){
//        color(Colour)
            Panel(Height,Width,Thick,Filet);
    
 
        rotate([90,0,90]){
            color(Colour){
//                     <- Cutting shapes from here ->
            // relay connectors
            SquareHole  (0,8.5,45,80,12,1); //(On/Off, Xpos,Ypos,Length,Width,Filet)
            
            // arduino uno power and usb   
            SquareHole  (1,10.2,7,9,11,1); //(On/Off, Xpos,Ypos,Length,Width,Filet)
            SquareHole  (1,38.2,7,12,10.5,1); //(On/Off, Xpos,Ypos,Length,Width,Filet)
            CylinderHole(1,61,15,7.2);       //(On/Off, Xpos, Ypos, Diameter)
            CylinderHole(1,61,28,7.2);       //(On/Off, Xpos, Ypos, Diameter)
//                            <- To here -> 

            rotate([0,180,0])
            translate ([-96,-1,-3.35]){
//                     <- Adding text from here ->          
//                LText(1,42,49,"Arial Black",4,"VPDMon 1.0");//(On/Off, Xpos, Ypos, "Font", Size, "Text")
                LText(1,3,50,"Arial Black",3,"7g");//(On/Off, Xpos, Ypos, "Font", Size, "Text")
//                CText(1,20,11.8,"Arial Black",2.4,5,260,25,"1.3.5.7.9");//(On/Off, Xpos, Ypos, "Font", Size, Diameter, Arc(Deg), Starting Angle(Deg),"Text")
//                            <- To here ->
            }
         }
      }
   }
}


/////////////////////////// <- Main part -> /////////////////////////

if(TShell==1) {
    // Coque bas - Top shell
    translate([0,Width,Height+0.2]){
        rotate([0,180,180]){
            color(Couleur1){ 
                difference() {
                    union() { // solid parts
                        difference() {
                            l = 27;
                            w = 6;
                            h = 16;
                            union() {
                                Coque();
                                translate([TPCBLength+TPCBPosX+1.5,TPCBPosY+3*Thick+33,Thick]) {
                                    cube([w,l,h]);
                                }
                            }
                            union() {
                                translate([TPCBLength+TPCBPosX+3.5,TPCBPosY+3*Thick+35,.4]) {
                                    cube([2,3,h+Thick]);
                                    translate([0,l/4,0])
                                        cube([2,3,h+Thick]);
                                    translate([0,l/2,0])
                                        cube([2,3,h+Thick]);
                                    translate([0,l*.75,0])
                                        cube([2,3,h+Thick]);
                                }
                            }
                        }
                    }
                    union() { // cut outs
                        SquareHole(0,TPCBLength+TPCBPosX-2,TPCBPosY+3*Thick+6,6,15,1);
                    }
                }
            }

            // Pied support PCB - PCB feet
            if (PCBFeet==1) {
            // Feet
                translate([PCBPosX,PCBPosY,0]){ 
                    Feet(PCBLength,PCBWidth,FootHeight,FootDia,FootHole,Foot1Offset,Foot2Offset,Foot3Offset,Foot4Offset,2);
                }
            }
        }
    }
        
        
}

if(BShell==1) {
// Coque haut - Bottom Shell
    color( Couleur1,1){
        Coque();
    }
    
    if (TPCBFeet==1) {
        translate([TPCBPosX,TPCBPosY,0]){ 
            Feet(TPCBLength,TPCBWidth,TFootHeight,TFootDia,TFootHole,0,0,0,0,2);
        }
    }

    if (PsuHolder==1) {
        difference() {
            translate ([64,18,Thick])
                cube([26,36,7]);
            translate ([67,21,Thick+1])
                cube([20,30,7]);
        }            
        
        translate ([86.5,22,Thick+1])
            foot(3,0,5,1);
        translate ([68,50,Thick+1])
            foot(3,0,5,1);
    }
}

// Panneau avant - Front panel  <<<<<< Text and holes only on this one.
//rotate([0,-90,-90]) 
if(FPanL==1)
        translate([Length-(Thick*2+m/2),Thick+m/2,Thick+m/2])
        FPanL();

//Panneau arrière - Back panel
if(BPanL==1)
        color(Couleur2)
        translate([Thick+m/2,Thick+m/2,Thick+m/2])
        BPanL(Couleur2);

// extras (clips)
if (Clips==1) {
    cube([22,3,2]);
    translate ([-2,1.5,-1])
        foot(5,2,4,1.5);
    translate ([24,1.5,-1])
        foot(5,2,4,1.5);
}
